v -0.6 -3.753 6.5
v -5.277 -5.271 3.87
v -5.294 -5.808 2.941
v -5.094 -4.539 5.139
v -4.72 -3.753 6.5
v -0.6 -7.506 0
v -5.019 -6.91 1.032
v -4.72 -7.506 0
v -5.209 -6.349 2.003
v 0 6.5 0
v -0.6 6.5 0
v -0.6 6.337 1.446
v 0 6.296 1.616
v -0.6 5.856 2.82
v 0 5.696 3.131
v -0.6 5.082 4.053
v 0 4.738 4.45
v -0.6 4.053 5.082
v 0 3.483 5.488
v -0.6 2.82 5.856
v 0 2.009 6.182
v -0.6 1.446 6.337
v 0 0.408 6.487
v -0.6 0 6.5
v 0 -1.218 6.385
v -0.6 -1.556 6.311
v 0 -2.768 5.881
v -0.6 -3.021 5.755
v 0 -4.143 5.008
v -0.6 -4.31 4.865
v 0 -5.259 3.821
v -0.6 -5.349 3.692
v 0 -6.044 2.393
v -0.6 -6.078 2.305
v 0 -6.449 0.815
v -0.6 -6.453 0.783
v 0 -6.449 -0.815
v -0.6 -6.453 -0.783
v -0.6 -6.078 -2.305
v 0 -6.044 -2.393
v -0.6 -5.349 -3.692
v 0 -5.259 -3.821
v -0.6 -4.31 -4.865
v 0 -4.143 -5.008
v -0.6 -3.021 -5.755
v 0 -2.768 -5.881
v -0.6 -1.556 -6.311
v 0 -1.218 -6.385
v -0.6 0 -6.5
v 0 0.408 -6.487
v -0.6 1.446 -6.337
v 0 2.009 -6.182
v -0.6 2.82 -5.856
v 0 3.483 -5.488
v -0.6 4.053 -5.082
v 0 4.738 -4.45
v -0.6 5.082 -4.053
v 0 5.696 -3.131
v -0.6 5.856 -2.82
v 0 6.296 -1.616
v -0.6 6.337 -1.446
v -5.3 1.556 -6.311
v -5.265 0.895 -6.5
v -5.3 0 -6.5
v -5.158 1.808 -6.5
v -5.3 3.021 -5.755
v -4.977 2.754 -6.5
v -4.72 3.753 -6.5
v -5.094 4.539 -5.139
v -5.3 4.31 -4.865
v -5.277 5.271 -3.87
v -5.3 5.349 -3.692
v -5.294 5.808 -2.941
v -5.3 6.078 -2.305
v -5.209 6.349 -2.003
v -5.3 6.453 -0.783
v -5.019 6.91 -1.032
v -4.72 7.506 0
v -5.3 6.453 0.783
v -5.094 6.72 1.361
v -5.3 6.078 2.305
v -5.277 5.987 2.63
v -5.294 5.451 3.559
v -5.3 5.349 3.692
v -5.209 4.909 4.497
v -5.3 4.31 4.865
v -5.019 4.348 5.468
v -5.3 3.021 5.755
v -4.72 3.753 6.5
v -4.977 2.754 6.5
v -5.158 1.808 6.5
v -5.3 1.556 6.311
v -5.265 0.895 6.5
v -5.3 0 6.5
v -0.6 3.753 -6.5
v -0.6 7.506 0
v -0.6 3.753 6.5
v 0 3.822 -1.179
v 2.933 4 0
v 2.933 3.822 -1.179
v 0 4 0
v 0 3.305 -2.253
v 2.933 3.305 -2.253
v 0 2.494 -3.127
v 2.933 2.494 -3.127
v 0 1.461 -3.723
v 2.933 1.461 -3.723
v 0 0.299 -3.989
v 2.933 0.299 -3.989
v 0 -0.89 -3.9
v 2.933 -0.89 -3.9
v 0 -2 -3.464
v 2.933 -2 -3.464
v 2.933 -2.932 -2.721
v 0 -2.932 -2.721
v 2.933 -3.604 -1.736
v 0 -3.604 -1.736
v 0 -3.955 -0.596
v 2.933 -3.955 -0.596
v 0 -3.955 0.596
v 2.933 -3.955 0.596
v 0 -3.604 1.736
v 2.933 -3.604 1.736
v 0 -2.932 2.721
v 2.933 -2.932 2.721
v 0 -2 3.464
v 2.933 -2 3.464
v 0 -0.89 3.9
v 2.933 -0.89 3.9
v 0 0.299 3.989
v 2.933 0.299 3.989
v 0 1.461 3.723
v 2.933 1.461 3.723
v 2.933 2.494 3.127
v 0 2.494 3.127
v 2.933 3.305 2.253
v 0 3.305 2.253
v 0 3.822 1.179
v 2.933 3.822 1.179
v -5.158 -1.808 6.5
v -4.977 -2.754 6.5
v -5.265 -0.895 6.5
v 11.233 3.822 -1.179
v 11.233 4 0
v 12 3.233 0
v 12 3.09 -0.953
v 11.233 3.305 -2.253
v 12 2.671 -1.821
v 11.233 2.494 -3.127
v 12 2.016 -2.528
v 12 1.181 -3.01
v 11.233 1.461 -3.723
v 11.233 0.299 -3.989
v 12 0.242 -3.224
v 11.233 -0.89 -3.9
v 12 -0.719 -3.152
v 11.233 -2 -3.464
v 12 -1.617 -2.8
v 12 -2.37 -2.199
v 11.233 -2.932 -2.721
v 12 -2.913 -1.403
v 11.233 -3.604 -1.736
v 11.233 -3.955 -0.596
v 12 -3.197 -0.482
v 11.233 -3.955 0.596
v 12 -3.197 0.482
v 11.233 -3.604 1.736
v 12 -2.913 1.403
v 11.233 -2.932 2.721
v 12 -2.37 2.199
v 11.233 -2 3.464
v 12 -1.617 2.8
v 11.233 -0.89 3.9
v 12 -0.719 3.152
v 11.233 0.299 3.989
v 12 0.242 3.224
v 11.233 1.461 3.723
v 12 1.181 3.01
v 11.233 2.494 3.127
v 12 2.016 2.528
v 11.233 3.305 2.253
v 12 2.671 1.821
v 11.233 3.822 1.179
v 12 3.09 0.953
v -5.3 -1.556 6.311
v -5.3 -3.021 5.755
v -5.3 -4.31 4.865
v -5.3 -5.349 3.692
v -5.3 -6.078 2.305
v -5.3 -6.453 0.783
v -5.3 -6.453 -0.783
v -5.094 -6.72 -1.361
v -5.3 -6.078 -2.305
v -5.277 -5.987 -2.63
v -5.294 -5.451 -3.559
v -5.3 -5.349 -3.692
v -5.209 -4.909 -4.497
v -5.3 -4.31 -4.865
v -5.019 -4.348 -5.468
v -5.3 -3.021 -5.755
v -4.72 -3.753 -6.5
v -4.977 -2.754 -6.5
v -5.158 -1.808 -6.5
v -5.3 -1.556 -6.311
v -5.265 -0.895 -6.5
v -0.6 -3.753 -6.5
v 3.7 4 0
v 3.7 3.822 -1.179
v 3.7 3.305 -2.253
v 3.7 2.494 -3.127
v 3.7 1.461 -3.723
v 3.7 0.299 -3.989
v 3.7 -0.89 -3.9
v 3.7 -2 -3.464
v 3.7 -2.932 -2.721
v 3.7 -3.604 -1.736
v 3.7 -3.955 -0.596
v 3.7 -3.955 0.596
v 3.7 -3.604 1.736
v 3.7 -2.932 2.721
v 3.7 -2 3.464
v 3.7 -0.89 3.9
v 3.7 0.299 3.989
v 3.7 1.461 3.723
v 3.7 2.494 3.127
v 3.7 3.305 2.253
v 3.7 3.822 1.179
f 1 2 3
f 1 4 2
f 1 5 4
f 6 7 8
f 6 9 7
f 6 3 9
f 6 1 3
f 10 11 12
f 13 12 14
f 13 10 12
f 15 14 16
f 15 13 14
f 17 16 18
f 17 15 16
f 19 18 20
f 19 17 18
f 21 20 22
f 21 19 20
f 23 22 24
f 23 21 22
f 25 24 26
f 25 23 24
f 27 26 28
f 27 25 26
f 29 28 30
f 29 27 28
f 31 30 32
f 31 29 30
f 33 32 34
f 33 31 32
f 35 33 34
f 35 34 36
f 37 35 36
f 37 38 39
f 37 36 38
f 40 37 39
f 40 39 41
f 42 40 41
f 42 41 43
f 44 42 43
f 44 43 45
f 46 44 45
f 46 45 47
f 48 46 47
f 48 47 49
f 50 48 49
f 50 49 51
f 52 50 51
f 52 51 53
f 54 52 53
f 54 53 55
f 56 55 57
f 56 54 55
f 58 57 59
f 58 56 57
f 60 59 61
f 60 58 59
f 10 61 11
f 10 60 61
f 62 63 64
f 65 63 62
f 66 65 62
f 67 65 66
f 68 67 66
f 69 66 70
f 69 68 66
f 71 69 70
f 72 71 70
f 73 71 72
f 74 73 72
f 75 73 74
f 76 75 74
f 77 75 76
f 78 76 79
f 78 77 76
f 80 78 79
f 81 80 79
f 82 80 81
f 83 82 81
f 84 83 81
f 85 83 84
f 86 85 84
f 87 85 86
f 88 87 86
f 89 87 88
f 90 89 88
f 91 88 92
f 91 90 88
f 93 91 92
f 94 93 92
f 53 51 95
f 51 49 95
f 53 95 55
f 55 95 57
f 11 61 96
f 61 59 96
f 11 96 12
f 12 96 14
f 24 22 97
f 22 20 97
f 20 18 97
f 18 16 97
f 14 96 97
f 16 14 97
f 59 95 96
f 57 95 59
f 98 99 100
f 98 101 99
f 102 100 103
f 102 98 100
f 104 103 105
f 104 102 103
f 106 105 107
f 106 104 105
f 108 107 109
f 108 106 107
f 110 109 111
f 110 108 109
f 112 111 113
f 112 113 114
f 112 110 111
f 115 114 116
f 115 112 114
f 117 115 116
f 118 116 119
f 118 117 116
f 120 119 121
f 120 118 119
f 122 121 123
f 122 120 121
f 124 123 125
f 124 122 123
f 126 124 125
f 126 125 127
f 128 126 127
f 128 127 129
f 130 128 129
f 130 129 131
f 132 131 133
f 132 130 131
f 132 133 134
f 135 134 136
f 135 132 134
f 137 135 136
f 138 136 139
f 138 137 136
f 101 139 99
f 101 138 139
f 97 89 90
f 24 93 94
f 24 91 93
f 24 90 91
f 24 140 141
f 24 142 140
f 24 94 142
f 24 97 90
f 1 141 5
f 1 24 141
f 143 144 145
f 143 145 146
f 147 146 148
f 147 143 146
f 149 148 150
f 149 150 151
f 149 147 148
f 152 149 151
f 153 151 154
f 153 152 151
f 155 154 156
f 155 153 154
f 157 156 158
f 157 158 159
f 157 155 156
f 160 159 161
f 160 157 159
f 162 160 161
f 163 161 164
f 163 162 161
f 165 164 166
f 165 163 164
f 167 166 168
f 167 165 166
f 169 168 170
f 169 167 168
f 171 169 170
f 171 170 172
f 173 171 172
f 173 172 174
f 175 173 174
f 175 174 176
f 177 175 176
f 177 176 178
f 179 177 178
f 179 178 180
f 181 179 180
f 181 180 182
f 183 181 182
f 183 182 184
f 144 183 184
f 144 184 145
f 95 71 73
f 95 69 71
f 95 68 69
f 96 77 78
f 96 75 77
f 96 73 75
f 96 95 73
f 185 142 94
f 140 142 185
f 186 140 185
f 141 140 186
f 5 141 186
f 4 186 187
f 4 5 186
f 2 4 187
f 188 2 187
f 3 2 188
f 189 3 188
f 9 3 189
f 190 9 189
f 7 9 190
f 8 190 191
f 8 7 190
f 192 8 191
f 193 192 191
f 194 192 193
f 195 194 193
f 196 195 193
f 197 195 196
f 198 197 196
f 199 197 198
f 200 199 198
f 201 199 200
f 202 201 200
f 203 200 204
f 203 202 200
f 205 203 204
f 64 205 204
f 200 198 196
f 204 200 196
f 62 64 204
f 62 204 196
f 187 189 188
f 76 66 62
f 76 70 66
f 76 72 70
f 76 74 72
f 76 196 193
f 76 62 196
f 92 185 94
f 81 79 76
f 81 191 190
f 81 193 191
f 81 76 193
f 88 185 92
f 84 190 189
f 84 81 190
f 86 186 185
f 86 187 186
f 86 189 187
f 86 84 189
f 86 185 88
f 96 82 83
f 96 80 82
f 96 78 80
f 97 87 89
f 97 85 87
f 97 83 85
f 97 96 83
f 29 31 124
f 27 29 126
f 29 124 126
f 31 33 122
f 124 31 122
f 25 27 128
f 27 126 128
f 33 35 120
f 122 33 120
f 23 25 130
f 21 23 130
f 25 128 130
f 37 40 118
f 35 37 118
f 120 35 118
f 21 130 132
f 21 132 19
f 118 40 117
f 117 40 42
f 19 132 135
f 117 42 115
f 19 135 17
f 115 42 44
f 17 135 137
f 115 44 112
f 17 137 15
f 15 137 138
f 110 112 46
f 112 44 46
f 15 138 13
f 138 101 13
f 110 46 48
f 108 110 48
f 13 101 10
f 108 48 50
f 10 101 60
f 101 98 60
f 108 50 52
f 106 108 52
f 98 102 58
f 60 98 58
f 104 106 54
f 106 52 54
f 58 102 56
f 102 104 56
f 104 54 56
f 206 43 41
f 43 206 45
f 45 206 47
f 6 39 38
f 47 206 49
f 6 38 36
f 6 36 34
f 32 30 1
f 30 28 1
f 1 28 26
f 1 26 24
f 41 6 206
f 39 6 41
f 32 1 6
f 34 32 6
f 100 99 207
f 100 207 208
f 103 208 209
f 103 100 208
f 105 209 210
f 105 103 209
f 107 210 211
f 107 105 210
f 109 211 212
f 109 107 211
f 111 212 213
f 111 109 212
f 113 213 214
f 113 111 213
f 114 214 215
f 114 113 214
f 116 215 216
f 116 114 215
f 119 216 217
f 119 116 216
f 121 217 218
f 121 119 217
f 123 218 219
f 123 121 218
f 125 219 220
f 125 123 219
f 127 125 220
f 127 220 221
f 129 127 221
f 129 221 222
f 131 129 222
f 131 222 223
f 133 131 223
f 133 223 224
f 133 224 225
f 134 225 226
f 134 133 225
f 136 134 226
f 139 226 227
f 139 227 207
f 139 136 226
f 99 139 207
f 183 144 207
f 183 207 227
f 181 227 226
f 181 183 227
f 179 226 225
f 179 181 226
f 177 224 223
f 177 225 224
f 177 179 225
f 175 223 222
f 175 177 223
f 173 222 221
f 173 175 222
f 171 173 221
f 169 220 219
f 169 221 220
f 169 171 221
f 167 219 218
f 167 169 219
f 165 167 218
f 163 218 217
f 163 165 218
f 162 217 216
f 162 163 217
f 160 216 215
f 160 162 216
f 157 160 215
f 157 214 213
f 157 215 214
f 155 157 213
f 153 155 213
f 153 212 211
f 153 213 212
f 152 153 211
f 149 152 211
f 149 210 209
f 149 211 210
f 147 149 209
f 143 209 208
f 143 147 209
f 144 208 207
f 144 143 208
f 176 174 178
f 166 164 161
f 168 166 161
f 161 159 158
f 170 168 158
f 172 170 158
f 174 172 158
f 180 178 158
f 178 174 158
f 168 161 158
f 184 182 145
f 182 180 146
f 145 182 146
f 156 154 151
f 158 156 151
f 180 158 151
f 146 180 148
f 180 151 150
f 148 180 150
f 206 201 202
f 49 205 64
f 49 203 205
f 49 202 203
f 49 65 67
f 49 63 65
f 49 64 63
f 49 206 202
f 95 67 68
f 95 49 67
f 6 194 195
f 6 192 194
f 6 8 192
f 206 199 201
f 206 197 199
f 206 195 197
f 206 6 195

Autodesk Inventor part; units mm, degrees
ref_plane "YZ Plane" through (0, 0, 0) normal (1, 0, 0) x (0, 1, 0)
ref_plane "XZ Plane" through (0, 0, 0) normal (0, 1, 0) x (-1, 0, 0)
sketch "Sketch1" plane through (0, 0, 0) normal (0, 0, 1) x (1, 0, 0)
  line L0 (0, 6.5) -> (0, 4)
  line L1 (3.7, 4) -> (12, 4)
  line L2 (12, 4) -> (12, 0)
  line L3 (12, 0) -> (-0.6001, 0)
  line L4 (-3.1201, 0) -> (14.52, 0) projected
  line L5 (-0.6001, 0) -> (-0.6001, 6.5)
  line L6 (-0.6001, 6.5) -> (0, 6.5)
  line L7 (3.7, 4) -> (2.9331, 4)
  line L8 (2.9331, 4) -> (0, 4)
  line L9 (0, -1.3) -> (0, 7.8) projected
  dimension "d0" = 12
  dimension "d1" = 8.3
  dimension "d2" = 8
  dimension "d9" = 0.6001
  dimension "d10" = 13
  dimension "d13" = 0.7669
  dimension "d14" = 8
revolve "Body" add sketch "Sketch1" angle 360 about axis through (12, 0, 0) along (-1, 0, 0)
sketch "Sketch2" plane through (-0.6001, 0, 0) normal (-1, 0, 0) x (0, 0, 1)
  line L0 (0, 7.5056) -> (6.5, 3.7528)
  line L1 (6.5, 3.7528) -> (6.5, -3.7528)
  line L2 (6.5, -3.7528) -> (0, -7.5056)
  line L3 (0, -7.5056) -> (-6.5, -3.7528)
  line L4 (-6.5, -3.7528) -> (-6.5, 3.7528)
  line L5 (-6.5, 3.7528) -> (0, 7.5056)
  point P0 (0, 0)
  point P1 (0, 0)
  dimension "d11" = 13
extrude "Head" add sketch "Sketch2" along normal blind 4.7
sketch "Sketch4" plane through (0, 0, 0) normal (0, 0, 1) x (1, 0, 0)
  line L0 (-5.3001, 6.5) -> (-5.3001, 7.5056)
  line L1 (-5.3001, 7.5056) -> (-4.7195, 7.5056)
  line L2 (-4.7195, 7.5056) -> (-5.3001, 6.5)
  line L3 (-6.2401, 0) -> (0.3399, 0) projected
  line L4 (-0.6001, 7.5056) -> (-5.3001, 7.5056) projected
  line L5 (-5.3001, 3.7528) -> (-5.3001, 7.5056) projected
  dimension "d5" = 30
  dimension "d19" = 13
revolve "Chamfer1" cut sketch "Sketch4" angle 360 about axis through (-10, 0, 0) along (1, 0, 0)
thread "Thread" size "M8x1.25" class "6g" standard "ISO Metric profile" length 8.3
chamfer "Chamfer2" distance 0.7668 distance2 0.7669 1 edges at (12, -4, 0) measured on face at (12, -0.0467, -2.2623)
ref_plane "Work Plane1" through (1.525, 0, 0) normal (0, 0, 1) x (1, 0, 0)
equation "\"d0\" = NLG"
equation "\"d1\" = GEL"
equation "\"d2\" = GD"
equation "\"d10\" = SD2"
equation "\"d14\" = BDM"
equation "\"d11\" = SW"
equation "\"d3\" = KOH - SD"
equation "\"d5\" = ANG1"
equation "\"d19\" = SW0"
equation "\"d15\" = GEL"
equation "\"d6\" = -0.5 * SPD + 0.5 * GD"
equation "\"NLG\" = 12"
equation "\"GD\" = NND"
equation "\"BDM\" = NND"
equation "\"KOH\" = 5.3"
equation "\"GEL\" = 8.3"
equation "\"SW\" = 13"
equation "\"SW0\" = SW"
equation "\"SPD\" = NND - 1.2269 * PTC"
equation "\"SD2\" = SW"
equation "\"SD\" = 0.6"
equation "\"ANG1\" = 30deg"
equation "\"GAL\" = 0.61345 * PTC"
equation "\"GUL\" = 0.61345 * PTC"
equation "\"RR\" = 0.4"
equation "\"WFT\" = SD"
equation "\"GD1\" = THREADDIA - 1.2269 * PTC"
equation "\"THREADDIA\" = 8"
equation "\"SDH\" = SW"
equation "\"TOA\" = 30deg"
equation "\"FAWI\" = 45deg"
equation "\"PTC\" = 1.25"
equation "\"NND\" = 8"
equation "\"E0\" = 1.155 * SW"
properties part number "AS 1110 - M8 x 12" material "Steel, Mild"
